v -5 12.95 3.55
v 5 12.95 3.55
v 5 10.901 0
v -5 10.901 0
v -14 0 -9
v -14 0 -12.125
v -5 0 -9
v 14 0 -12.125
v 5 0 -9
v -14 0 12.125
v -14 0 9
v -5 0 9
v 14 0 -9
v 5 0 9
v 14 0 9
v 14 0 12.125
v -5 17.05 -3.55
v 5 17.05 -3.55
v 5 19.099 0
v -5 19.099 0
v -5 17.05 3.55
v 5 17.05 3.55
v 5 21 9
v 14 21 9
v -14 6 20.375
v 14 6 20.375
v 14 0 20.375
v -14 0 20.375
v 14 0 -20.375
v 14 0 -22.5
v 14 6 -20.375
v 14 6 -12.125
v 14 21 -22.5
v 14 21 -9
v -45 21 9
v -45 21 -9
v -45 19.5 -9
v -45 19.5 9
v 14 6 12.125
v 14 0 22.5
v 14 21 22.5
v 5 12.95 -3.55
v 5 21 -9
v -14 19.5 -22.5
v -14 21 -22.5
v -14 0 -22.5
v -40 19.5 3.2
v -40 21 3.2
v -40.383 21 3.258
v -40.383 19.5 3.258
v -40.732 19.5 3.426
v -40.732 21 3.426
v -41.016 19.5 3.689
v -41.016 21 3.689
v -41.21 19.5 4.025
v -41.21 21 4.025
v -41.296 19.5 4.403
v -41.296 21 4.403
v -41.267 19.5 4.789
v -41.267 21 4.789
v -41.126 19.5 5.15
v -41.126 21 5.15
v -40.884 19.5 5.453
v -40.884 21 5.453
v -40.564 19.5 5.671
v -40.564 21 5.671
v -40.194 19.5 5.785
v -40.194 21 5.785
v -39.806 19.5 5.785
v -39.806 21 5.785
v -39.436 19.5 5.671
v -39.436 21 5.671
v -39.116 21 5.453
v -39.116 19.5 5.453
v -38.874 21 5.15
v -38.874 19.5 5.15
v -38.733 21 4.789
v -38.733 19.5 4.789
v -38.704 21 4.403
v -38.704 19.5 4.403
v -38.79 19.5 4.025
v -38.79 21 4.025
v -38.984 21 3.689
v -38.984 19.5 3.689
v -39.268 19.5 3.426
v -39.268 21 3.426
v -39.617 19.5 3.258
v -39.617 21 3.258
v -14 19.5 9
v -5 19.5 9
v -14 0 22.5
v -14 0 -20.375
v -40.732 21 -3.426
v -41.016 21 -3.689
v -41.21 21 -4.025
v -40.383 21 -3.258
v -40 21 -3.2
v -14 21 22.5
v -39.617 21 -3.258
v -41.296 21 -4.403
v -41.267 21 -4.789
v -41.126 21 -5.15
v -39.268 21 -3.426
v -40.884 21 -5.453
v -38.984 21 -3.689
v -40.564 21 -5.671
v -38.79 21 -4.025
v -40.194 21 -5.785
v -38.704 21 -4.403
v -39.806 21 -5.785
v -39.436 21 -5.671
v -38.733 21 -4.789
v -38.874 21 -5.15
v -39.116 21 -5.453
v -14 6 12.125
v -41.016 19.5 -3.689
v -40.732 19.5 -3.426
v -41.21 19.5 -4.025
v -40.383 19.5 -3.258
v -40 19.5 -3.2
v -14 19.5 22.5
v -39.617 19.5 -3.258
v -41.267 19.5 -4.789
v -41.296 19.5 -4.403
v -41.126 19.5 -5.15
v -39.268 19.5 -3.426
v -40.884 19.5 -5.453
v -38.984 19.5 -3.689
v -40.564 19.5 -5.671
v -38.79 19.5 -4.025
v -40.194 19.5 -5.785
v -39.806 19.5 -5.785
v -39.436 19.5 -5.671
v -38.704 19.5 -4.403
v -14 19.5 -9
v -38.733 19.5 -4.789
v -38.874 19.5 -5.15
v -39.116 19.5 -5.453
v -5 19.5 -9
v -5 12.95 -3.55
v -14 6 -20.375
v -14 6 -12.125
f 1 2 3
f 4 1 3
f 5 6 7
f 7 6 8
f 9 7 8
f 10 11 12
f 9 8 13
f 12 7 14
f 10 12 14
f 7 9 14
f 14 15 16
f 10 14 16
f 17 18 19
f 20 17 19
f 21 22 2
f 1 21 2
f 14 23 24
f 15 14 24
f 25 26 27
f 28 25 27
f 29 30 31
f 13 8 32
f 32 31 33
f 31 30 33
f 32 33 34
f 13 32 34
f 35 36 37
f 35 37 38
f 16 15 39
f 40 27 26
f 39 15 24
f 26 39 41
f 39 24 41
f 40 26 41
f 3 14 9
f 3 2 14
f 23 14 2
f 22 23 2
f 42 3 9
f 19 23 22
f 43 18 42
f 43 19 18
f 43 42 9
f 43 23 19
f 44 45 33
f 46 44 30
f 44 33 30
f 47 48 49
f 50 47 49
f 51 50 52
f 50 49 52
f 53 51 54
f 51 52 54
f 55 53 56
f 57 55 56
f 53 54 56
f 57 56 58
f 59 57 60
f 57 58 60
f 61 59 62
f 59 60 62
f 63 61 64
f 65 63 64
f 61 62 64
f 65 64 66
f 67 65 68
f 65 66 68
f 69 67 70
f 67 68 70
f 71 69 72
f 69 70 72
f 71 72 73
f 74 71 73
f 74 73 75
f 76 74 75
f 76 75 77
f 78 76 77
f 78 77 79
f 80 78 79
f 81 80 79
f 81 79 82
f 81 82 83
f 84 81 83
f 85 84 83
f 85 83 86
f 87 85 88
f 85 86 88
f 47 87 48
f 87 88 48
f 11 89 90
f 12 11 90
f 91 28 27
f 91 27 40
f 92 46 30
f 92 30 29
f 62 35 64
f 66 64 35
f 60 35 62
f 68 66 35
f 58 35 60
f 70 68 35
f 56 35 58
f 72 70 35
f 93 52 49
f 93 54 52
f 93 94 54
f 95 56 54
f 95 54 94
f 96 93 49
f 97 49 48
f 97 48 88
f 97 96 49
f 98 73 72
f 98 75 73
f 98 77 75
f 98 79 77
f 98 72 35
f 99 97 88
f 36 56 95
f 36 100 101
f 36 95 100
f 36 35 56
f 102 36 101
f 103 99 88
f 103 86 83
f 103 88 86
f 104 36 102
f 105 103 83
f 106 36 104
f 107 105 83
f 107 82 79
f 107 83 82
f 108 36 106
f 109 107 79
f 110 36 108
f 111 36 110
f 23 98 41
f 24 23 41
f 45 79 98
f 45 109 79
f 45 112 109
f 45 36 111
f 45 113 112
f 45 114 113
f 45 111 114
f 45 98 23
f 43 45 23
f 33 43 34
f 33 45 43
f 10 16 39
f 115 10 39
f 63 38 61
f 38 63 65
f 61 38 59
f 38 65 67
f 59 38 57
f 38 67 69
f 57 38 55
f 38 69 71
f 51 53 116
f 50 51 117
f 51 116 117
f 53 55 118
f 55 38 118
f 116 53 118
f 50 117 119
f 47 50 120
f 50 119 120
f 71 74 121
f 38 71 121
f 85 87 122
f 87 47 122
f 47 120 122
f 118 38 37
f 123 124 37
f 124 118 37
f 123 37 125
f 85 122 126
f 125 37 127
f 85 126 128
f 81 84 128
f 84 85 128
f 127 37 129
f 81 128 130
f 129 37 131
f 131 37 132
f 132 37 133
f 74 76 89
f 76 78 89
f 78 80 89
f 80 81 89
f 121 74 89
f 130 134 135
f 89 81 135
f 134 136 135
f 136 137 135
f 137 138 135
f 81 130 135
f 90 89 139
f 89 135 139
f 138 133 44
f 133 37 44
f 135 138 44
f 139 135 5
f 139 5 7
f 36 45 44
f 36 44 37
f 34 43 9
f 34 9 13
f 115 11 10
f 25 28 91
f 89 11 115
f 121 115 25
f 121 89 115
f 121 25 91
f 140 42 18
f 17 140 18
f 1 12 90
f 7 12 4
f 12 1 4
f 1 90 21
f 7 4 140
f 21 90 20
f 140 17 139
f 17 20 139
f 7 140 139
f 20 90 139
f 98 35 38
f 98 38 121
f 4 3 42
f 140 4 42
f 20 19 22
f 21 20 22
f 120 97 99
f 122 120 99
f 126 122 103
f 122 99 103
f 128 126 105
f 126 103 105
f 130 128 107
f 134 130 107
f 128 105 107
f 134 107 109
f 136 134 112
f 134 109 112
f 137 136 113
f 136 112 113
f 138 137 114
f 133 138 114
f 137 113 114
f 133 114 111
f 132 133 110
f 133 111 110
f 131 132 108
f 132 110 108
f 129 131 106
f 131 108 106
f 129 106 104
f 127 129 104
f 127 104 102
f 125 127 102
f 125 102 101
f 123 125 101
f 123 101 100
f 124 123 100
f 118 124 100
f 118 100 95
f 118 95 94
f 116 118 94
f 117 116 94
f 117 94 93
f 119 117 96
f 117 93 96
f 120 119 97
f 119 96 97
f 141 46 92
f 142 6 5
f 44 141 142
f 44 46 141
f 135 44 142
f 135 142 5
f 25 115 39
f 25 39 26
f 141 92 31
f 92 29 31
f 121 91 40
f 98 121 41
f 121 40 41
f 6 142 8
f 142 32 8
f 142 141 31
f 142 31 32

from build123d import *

# Parameters (mm, degrees)
BOSS_EXTRUDE1_DEPTH = 14
SKETCH2_W           = 18
SKETCH2_H           = 18
CUT_EXTRUDE1_DEPTH  = 21
SKETCH3_R           = 1.3
BOSS_EXTRUDE2_DEPTH = 1.5


with BuildPart() as part:
    # Sketch1 → Boss-Extrude1 (new, symmetric)
    with BuildSketch(Plane(origin=(0, 0, 0), x_dir=(0, 0, -1), z_dir=(1, 0, 0))):
        Polygon((-22.5, 0), (-22.5, 21), (22.5, 21), (22.5, 0), (20.375, 0), (20.375, 6), (12.125, 6), (12.125, 0), (-12.125, 0), (-12.125, 6), (-20.375, 6), (-20.375, 0), align=None)
        Polygon((0, 10.900813089), (3.55, 12.950406544), (3.55, 17.049593456), (0, 19.099186911), (-3.55, 17.049593456), (-3.55, 12.950406544), align=None, mode=Mode.SUBTRACT)
    extrude(amount=BOSS_EXTRUDE1_DEPTH, both=True)

    # Sketch2 → Cut-Extrude1 (cut)
    with BuildSketch(Plane(origin=(0, 21, 0), x_dir=(1, 0, 0), z_dir=(0, 1, 0))):
        with Locations((-14, 0)):
            Rectangle(SKETCH2_W, SKETCH2_H)
        with Locations((14, 0)):
            Rectangle(SKETCH2_W, SKETCH2_H)
    extrude(amount=-CUT_EXTRUDE1_DEPTH, mode=Mode.SUBTRACT)

    # Sketch3 → Boss-Extrude2 (add)
    with BuildSketch(Plane(origin=(0, 21, 0), x_dir=(1, 0, 0), z_dir=(0, 1, 0))):
        Polygon((-5, -9), (-5, 9), (-14, 22.5), (-45, 9), (-45, -9), (-14, -22.5), align=None)
        with Locations(Location((-40, 4.5, 0), (0, 0, 270))):
            Circle(SKETCH3_R, mode=Mode.SUBTRACT)
        with Locations(Location((-40, -4.5, 0), (0, 0, 90))):
            Circle(SKETCH3_R, mode=Mode.SUBTRACT)
    extrude(amount=-BOSS_EXTRUDE2_DEPTH)


solid = part.part
